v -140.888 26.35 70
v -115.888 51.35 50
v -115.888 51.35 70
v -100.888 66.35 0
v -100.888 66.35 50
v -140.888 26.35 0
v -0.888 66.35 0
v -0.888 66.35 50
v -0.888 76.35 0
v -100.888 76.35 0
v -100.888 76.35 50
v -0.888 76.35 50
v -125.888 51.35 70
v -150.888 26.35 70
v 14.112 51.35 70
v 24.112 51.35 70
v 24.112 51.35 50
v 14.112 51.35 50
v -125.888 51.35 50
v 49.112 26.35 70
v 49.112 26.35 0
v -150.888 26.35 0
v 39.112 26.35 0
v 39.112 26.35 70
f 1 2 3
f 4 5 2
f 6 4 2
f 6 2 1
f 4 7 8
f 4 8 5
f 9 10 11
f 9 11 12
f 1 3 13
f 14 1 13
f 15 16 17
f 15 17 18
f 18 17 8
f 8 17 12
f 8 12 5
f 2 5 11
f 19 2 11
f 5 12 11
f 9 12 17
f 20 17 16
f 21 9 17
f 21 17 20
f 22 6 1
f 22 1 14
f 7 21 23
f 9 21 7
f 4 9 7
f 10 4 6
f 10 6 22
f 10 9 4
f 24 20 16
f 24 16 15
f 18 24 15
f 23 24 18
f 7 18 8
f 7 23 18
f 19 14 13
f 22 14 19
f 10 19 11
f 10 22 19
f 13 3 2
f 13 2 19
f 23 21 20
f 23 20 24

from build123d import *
from OCP.BRepAlgoAPI import BRepAlgoAPI_Cut
from OCP.TopTools import TopTools_ListOfShape

# Parameters (mm, degrees)
EXTRUDE_1_DEPTH     = 70
CUT_EXTRUDE_1_DEPTH = 20


with BuildPart() as part:
    # 草图2 → 凸台-拉伸1 (new body)
    with BuildSketch(Plane.XY):
        Polygon((-150.888329598, 26.350410604), (-100.888333902, 76.350410604), (-0.888333902, 76.350410604), (49.111670402, 26.350410604), (39.111670402, 26.350410604), (-0.888329598, 66.350410604), (-100.888329598, 66.350410604), (-140.888329598, 26.350410604), align=None)
    extrude(amount=EXTRUDE_1_DEPTH)


with BuildPart() as cut_extrude_1_tool:
    # 草图3 → 切除-拉伸1 (new body)
    with BuildSketch(Plane.XY.offset(70)):
        Polygon((-100.888333902, 76.350410604), (-0.888333902, 76.350410604), (24.111669326, 51.350411681), (14.111669326, 51.350411681), (-0.888329598, 66.350410604), (-100.888329598, 66.350410604), (-115.888330674, 51.350409528), (-125.888330674, 51.350409528), align=None)
    extrude(amount=-CUT_EXTRUDE_1_DEPTH)


with BuildPart() as part_1:
    add(part.part)

    # 切除-拉伸1: cut by cut_extrude_1_tool, with a tolerance
    cut_extrude_1_stock = TopTools_ListOfShape()
    cut_extrude_1_stock.Append(part_1.part.wrapped)
    cut_extrude_1_tools = TopTools_ListOfShape()
    cut_extrude_1_tools.Append(cut_extrude_1_tool.part.wrapped)
    cut_extrude_1_cut = BRepAlgoAPI_Cut()
    cut_extrude_1_cut.SetArguments(cut_extrude_1_stock)
    cut_extrude_1_cut.SetTools(cut_extrude_1_tools)
    cut_extrude_1_cut.SetFuzzyValue(0.00001)
    cut_extrude_1_cut.Build()
    add(Compound.cast(cut_extrude_1_cut.Shape()).solids(), mode=Mode.REPLACE)


solid = part_1.part
